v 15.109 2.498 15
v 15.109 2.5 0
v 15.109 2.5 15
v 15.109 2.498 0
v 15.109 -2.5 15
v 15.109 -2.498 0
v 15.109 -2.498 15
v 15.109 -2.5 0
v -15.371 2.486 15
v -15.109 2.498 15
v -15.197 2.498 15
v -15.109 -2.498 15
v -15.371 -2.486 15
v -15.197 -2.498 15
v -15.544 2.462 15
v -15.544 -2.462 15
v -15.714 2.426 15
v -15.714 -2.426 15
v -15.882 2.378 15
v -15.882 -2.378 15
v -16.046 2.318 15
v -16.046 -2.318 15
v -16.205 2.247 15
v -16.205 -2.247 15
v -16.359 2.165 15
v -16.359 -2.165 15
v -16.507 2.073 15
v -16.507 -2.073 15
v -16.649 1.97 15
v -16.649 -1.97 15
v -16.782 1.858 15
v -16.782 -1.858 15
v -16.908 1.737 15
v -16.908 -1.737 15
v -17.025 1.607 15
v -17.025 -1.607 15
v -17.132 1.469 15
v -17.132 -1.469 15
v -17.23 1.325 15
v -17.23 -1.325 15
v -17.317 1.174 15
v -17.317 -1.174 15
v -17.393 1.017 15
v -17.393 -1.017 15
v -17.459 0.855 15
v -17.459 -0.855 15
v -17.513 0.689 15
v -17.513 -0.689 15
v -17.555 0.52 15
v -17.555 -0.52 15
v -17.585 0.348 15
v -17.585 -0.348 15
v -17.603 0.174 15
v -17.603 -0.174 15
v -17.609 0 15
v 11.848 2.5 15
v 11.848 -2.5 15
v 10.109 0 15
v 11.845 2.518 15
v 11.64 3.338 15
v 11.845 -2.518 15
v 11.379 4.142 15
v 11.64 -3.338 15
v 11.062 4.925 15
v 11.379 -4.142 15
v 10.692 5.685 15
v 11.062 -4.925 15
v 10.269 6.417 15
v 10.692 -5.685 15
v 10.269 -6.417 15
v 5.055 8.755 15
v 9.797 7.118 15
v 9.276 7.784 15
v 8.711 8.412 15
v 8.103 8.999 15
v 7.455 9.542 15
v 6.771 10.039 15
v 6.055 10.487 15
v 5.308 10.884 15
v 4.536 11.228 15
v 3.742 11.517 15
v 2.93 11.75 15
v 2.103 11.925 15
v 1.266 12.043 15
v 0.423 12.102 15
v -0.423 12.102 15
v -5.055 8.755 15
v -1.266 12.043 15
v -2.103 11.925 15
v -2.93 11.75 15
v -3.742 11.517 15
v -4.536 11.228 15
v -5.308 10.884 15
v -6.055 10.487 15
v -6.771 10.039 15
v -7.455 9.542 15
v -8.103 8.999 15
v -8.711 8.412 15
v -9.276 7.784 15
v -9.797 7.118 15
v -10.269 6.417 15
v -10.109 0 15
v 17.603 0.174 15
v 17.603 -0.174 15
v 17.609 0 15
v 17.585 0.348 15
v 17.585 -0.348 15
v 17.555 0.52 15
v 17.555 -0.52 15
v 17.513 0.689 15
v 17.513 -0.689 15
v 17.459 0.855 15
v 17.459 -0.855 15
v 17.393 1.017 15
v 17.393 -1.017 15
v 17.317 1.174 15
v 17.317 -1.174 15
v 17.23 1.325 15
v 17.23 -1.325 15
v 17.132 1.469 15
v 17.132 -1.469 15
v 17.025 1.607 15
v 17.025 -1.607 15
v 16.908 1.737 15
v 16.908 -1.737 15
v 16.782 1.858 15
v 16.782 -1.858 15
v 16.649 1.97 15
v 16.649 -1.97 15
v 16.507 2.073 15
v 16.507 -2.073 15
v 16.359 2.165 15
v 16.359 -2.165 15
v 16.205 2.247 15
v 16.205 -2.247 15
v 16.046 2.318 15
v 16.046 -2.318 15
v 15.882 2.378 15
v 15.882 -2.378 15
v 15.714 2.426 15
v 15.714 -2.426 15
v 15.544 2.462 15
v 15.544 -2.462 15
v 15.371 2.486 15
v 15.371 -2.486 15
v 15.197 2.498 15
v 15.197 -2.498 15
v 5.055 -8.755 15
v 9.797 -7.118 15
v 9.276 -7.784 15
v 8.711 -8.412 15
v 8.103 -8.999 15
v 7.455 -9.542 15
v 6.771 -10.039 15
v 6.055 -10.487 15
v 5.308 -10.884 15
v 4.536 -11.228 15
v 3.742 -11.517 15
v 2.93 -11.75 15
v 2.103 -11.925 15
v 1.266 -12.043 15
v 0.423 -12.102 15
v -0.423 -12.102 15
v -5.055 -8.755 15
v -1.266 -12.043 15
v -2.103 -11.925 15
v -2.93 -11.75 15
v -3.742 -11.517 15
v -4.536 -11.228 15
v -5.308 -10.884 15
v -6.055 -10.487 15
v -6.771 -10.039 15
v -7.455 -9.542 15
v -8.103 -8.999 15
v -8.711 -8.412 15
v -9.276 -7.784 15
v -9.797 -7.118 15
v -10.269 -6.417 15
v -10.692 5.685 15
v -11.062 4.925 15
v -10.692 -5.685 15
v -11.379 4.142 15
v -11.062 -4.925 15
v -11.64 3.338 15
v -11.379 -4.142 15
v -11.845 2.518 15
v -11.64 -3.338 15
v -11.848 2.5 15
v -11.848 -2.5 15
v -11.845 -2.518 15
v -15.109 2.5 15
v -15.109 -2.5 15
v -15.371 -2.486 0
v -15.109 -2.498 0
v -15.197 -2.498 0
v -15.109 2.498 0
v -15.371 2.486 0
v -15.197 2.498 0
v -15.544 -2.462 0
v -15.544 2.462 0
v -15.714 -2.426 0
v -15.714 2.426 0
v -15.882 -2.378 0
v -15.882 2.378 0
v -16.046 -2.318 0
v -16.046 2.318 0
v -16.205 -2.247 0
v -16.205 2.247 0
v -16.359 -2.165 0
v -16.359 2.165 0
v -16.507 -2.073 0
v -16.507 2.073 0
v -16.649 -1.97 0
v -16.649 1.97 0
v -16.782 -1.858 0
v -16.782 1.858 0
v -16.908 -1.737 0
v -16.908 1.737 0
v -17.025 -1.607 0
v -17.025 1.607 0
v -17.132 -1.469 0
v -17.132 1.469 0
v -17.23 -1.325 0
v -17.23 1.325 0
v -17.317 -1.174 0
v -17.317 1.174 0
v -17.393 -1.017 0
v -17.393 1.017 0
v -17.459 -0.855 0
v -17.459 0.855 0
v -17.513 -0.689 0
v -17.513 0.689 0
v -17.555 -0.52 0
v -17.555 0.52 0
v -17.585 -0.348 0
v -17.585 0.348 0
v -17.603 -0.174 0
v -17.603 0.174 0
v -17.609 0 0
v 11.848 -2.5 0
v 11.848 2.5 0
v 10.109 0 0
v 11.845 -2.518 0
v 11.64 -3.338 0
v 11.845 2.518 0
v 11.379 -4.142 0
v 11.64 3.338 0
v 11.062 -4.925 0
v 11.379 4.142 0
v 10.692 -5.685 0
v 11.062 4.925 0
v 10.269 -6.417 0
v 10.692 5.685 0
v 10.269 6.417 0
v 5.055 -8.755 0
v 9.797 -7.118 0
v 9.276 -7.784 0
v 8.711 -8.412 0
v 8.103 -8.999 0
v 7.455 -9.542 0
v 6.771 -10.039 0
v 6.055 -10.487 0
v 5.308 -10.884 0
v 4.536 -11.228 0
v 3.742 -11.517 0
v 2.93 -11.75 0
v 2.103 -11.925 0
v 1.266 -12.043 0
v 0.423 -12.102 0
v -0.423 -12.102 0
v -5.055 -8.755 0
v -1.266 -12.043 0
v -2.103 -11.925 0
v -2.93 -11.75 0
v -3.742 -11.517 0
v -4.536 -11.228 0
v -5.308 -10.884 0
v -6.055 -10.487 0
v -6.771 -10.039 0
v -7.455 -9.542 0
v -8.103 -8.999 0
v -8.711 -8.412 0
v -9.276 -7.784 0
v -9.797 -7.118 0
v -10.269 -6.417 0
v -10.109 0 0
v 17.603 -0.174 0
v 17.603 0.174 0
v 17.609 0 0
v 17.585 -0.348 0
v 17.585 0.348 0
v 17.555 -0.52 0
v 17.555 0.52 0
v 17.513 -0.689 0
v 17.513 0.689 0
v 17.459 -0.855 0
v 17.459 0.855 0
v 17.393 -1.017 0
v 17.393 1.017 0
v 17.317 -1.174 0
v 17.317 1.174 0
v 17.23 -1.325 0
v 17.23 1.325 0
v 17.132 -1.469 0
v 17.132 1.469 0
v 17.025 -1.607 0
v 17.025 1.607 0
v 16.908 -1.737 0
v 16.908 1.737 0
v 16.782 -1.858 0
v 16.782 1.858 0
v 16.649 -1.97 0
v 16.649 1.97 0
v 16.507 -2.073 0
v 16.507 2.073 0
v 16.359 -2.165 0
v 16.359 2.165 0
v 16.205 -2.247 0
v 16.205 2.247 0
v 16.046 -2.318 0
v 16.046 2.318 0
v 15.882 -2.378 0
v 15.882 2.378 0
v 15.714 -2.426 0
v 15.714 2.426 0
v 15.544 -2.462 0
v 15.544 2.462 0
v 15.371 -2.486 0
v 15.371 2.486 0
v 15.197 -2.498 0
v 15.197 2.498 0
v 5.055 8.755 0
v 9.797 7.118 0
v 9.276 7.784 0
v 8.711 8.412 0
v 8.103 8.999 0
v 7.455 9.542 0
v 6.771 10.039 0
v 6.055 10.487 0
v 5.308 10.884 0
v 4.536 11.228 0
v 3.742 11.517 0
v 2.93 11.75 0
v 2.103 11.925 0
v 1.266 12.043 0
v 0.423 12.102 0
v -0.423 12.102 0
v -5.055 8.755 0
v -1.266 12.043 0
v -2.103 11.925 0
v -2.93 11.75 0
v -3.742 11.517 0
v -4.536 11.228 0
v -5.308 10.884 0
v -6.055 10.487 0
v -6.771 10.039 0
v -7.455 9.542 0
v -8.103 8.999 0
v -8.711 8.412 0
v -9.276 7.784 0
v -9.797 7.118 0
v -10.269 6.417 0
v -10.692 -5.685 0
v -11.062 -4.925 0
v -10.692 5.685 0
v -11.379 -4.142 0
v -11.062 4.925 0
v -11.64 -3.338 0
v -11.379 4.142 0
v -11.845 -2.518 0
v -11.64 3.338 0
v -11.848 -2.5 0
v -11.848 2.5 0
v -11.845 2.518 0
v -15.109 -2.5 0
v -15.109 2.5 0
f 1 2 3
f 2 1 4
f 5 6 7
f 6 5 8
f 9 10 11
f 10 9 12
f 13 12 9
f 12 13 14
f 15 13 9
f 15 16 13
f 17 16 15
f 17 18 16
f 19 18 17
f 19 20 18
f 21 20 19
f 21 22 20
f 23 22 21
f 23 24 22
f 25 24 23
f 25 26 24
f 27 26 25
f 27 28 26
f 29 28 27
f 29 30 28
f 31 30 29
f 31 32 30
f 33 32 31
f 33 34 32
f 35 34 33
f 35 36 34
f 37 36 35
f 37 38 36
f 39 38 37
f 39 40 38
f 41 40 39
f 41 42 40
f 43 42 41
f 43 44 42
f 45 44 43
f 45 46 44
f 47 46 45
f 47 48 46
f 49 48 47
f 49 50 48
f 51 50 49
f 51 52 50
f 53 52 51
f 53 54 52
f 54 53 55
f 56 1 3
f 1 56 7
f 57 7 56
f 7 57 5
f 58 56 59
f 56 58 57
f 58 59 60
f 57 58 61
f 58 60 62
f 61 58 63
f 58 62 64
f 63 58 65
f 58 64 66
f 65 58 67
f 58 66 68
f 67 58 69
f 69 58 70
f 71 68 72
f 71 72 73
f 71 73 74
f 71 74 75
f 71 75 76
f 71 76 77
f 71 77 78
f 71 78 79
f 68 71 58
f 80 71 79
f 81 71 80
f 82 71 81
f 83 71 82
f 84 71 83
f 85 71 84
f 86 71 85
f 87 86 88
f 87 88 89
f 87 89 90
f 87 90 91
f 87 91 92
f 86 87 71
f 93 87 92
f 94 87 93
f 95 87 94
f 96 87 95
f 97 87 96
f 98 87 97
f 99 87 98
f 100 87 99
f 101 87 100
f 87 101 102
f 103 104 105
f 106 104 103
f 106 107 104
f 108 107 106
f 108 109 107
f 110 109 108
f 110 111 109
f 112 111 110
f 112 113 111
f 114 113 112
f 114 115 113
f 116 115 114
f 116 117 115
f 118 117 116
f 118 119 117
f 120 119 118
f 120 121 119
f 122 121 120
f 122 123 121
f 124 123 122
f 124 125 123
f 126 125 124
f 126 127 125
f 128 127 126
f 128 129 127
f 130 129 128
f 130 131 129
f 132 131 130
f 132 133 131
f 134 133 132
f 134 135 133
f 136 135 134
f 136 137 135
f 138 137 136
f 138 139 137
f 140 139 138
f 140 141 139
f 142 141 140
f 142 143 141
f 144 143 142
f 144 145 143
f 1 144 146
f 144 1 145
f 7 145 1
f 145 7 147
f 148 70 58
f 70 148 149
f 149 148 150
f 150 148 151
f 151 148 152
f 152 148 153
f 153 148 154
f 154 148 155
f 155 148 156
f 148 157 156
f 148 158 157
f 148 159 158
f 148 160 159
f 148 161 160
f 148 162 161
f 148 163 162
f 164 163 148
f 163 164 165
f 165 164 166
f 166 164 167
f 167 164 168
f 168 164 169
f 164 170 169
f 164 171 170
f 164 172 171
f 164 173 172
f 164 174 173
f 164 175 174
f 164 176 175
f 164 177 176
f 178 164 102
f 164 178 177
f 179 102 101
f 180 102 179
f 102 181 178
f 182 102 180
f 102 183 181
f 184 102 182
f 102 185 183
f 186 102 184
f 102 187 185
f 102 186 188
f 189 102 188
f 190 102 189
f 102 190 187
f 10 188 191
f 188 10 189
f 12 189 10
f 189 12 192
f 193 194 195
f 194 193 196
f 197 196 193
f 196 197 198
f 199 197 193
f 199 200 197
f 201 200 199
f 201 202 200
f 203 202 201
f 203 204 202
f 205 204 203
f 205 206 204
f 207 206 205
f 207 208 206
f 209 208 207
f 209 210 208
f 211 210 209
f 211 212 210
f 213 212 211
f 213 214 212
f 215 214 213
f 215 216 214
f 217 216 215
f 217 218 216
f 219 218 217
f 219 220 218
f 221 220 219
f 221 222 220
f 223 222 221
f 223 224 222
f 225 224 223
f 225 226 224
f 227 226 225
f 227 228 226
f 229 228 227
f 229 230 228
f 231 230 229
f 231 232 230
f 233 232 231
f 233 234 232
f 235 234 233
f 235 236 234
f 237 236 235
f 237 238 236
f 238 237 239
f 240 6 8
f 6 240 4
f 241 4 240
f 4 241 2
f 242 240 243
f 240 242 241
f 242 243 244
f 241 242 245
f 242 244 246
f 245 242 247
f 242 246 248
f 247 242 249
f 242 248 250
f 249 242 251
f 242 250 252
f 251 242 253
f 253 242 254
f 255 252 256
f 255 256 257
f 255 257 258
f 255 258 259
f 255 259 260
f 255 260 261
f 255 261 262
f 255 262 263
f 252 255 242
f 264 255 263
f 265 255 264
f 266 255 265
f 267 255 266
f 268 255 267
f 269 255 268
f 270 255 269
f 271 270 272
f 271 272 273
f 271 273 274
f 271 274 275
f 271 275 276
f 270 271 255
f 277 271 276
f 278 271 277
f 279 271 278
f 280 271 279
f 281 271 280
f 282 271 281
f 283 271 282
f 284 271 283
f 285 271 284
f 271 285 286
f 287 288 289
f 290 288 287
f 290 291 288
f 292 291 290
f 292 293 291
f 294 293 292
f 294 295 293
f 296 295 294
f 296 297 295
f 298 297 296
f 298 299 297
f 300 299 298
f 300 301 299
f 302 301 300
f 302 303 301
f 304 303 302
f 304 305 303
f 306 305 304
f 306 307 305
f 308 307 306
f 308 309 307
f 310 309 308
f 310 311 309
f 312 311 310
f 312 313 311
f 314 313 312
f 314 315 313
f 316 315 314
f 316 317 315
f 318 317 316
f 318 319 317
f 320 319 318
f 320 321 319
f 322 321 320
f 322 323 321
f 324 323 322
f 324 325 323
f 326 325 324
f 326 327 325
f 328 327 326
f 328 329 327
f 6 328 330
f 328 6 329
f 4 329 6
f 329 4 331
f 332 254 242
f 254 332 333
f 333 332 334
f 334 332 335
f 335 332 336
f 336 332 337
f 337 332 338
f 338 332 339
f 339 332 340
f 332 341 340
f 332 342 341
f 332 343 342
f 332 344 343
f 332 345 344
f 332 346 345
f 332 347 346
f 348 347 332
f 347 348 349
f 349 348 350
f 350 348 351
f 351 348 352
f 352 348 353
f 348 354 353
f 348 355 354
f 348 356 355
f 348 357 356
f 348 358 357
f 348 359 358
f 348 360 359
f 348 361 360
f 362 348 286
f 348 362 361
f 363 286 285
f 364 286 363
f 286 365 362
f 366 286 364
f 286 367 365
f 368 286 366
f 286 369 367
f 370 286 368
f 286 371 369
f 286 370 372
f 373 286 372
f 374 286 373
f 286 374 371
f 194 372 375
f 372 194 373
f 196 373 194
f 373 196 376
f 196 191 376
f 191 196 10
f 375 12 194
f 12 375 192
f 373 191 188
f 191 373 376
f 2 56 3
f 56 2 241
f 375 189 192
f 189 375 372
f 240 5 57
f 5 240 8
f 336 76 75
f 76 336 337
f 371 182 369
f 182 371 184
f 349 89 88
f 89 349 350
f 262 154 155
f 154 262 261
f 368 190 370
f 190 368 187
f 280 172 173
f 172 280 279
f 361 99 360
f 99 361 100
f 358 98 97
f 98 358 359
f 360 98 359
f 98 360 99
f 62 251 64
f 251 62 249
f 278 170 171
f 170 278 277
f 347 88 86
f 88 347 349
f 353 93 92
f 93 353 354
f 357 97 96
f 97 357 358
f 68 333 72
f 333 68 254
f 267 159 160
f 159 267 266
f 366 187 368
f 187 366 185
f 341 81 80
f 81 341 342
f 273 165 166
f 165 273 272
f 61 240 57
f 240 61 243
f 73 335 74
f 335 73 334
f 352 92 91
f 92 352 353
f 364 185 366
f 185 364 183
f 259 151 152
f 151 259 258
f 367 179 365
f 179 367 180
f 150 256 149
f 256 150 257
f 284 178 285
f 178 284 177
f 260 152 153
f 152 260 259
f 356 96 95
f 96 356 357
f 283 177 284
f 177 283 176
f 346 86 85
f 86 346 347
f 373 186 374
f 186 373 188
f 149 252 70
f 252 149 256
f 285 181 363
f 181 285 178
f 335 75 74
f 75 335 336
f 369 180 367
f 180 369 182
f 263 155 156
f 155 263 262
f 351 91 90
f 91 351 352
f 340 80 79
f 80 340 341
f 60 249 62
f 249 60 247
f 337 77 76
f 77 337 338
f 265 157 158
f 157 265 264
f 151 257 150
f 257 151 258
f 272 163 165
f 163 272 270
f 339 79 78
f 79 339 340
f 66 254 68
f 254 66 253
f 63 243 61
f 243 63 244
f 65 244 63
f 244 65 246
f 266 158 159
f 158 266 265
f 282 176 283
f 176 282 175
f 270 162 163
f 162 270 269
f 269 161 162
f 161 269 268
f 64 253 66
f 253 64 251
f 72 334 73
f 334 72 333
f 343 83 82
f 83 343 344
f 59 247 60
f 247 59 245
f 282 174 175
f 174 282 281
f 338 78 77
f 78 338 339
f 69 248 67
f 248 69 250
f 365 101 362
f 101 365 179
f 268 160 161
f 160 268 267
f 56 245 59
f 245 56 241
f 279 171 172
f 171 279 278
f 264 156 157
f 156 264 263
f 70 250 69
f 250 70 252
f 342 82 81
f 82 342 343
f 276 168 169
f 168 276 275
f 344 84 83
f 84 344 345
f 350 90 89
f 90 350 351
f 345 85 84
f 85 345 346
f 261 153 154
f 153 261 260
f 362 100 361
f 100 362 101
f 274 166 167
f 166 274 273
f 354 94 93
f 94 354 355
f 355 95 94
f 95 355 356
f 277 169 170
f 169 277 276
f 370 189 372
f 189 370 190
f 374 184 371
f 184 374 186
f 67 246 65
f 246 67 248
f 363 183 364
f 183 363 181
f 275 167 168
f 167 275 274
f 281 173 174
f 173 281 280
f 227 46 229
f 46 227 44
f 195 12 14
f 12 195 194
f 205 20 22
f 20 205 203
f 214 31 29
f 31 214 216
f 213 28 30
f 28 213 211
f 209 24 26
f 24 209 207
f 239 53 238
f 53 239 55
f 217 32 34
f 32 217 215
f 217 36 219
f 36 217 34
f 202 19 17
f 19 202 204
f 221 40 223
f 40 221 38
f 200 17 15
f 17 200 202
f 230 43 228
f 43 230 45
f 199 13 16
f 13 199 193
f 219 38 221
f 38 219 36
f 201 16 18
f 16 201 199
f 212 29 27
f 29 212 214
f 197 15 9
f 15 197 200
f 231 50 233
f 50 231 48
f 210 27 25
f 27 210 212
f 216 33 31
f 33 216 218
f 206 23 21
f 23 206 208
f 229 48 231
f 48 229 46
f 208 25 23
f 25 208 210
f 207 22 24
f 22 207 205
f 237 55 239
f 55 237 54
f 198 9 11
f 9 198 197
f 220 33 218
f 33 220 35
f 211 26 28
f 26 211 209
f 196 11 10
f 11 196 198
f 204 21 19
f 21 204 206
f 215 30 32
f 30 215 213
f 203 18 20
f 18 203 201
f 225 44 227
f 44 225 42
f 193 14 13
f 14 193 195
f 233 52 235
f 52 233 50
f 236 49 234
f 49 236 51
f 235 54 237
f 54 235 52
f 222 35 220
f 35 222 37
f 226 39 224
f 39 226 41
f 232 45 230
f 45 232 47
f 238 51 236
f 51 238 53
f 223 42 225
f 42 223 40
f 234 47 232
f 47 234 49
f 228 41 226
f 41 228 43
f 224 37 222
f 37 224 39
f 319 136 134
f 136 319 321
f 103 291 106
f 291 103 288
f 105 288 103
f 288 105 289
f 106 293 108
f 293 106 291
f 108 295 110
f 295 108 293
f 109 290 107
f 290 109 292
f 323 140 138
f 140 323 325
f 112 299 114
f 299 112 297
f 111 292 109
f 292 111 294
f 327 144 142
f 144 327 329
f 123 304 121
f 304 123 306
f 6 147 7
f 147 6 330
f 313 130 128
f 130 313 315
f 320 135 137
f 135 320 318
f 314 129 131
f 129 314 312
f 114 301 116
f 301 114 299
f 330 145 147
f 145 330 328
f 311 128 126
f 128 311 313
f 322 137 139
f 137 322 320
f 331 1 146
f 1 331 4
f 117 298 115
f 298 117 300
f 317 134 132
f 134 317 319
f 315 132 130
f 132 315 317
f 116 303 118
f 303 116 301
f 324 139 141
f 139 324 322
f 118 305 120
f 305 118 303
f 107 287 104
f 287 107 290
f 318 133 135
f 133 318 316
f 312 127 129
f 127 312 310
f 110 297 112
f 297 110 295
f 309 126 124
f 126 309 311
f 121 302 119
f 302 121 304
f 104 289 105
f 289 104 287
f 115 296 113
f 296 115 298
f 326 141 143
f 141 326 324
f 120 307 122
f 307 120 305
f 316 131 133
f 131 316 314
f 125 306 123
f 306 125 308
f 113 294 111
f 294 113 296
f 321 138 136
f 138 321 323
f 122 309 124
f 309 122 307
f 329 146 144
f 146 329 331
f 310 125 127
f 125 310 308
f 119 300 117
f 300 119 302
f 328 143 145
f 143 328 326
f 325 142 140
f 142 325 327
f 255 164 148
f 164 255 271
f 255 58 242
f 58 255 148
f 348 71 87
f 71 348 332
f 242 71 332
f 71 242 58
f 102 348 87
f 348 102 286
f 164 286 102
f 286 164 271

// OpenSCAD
/* socketTool1.scad */
/* This is the hex size in mm */
size = 17;

/* This is the total height of the tool */
height = 15;

/* No need to touch this stuff... */
$fn = 90;
d = 2*1.03*size/sqrt(3);
handle_total_l = d+2+4*2;
handleh = 15;
handle_thick = 5;

difference(){
    union(){
        translate([-handle_total_l/2,-handle_thick/2,0])cube([handle_total_l,handle_thick,handleh]);
        cylinder(h = height, d=d+4);
        translate([-handle_total_l/2,0,0])cylinder(d = handle_thick, h = handleh);
        translate([handle_total_l/2,0,0])cylinder(d = handle_thick, h = handleh);
    }
    cylinder($fn = 6, h = height, d=d);
}
